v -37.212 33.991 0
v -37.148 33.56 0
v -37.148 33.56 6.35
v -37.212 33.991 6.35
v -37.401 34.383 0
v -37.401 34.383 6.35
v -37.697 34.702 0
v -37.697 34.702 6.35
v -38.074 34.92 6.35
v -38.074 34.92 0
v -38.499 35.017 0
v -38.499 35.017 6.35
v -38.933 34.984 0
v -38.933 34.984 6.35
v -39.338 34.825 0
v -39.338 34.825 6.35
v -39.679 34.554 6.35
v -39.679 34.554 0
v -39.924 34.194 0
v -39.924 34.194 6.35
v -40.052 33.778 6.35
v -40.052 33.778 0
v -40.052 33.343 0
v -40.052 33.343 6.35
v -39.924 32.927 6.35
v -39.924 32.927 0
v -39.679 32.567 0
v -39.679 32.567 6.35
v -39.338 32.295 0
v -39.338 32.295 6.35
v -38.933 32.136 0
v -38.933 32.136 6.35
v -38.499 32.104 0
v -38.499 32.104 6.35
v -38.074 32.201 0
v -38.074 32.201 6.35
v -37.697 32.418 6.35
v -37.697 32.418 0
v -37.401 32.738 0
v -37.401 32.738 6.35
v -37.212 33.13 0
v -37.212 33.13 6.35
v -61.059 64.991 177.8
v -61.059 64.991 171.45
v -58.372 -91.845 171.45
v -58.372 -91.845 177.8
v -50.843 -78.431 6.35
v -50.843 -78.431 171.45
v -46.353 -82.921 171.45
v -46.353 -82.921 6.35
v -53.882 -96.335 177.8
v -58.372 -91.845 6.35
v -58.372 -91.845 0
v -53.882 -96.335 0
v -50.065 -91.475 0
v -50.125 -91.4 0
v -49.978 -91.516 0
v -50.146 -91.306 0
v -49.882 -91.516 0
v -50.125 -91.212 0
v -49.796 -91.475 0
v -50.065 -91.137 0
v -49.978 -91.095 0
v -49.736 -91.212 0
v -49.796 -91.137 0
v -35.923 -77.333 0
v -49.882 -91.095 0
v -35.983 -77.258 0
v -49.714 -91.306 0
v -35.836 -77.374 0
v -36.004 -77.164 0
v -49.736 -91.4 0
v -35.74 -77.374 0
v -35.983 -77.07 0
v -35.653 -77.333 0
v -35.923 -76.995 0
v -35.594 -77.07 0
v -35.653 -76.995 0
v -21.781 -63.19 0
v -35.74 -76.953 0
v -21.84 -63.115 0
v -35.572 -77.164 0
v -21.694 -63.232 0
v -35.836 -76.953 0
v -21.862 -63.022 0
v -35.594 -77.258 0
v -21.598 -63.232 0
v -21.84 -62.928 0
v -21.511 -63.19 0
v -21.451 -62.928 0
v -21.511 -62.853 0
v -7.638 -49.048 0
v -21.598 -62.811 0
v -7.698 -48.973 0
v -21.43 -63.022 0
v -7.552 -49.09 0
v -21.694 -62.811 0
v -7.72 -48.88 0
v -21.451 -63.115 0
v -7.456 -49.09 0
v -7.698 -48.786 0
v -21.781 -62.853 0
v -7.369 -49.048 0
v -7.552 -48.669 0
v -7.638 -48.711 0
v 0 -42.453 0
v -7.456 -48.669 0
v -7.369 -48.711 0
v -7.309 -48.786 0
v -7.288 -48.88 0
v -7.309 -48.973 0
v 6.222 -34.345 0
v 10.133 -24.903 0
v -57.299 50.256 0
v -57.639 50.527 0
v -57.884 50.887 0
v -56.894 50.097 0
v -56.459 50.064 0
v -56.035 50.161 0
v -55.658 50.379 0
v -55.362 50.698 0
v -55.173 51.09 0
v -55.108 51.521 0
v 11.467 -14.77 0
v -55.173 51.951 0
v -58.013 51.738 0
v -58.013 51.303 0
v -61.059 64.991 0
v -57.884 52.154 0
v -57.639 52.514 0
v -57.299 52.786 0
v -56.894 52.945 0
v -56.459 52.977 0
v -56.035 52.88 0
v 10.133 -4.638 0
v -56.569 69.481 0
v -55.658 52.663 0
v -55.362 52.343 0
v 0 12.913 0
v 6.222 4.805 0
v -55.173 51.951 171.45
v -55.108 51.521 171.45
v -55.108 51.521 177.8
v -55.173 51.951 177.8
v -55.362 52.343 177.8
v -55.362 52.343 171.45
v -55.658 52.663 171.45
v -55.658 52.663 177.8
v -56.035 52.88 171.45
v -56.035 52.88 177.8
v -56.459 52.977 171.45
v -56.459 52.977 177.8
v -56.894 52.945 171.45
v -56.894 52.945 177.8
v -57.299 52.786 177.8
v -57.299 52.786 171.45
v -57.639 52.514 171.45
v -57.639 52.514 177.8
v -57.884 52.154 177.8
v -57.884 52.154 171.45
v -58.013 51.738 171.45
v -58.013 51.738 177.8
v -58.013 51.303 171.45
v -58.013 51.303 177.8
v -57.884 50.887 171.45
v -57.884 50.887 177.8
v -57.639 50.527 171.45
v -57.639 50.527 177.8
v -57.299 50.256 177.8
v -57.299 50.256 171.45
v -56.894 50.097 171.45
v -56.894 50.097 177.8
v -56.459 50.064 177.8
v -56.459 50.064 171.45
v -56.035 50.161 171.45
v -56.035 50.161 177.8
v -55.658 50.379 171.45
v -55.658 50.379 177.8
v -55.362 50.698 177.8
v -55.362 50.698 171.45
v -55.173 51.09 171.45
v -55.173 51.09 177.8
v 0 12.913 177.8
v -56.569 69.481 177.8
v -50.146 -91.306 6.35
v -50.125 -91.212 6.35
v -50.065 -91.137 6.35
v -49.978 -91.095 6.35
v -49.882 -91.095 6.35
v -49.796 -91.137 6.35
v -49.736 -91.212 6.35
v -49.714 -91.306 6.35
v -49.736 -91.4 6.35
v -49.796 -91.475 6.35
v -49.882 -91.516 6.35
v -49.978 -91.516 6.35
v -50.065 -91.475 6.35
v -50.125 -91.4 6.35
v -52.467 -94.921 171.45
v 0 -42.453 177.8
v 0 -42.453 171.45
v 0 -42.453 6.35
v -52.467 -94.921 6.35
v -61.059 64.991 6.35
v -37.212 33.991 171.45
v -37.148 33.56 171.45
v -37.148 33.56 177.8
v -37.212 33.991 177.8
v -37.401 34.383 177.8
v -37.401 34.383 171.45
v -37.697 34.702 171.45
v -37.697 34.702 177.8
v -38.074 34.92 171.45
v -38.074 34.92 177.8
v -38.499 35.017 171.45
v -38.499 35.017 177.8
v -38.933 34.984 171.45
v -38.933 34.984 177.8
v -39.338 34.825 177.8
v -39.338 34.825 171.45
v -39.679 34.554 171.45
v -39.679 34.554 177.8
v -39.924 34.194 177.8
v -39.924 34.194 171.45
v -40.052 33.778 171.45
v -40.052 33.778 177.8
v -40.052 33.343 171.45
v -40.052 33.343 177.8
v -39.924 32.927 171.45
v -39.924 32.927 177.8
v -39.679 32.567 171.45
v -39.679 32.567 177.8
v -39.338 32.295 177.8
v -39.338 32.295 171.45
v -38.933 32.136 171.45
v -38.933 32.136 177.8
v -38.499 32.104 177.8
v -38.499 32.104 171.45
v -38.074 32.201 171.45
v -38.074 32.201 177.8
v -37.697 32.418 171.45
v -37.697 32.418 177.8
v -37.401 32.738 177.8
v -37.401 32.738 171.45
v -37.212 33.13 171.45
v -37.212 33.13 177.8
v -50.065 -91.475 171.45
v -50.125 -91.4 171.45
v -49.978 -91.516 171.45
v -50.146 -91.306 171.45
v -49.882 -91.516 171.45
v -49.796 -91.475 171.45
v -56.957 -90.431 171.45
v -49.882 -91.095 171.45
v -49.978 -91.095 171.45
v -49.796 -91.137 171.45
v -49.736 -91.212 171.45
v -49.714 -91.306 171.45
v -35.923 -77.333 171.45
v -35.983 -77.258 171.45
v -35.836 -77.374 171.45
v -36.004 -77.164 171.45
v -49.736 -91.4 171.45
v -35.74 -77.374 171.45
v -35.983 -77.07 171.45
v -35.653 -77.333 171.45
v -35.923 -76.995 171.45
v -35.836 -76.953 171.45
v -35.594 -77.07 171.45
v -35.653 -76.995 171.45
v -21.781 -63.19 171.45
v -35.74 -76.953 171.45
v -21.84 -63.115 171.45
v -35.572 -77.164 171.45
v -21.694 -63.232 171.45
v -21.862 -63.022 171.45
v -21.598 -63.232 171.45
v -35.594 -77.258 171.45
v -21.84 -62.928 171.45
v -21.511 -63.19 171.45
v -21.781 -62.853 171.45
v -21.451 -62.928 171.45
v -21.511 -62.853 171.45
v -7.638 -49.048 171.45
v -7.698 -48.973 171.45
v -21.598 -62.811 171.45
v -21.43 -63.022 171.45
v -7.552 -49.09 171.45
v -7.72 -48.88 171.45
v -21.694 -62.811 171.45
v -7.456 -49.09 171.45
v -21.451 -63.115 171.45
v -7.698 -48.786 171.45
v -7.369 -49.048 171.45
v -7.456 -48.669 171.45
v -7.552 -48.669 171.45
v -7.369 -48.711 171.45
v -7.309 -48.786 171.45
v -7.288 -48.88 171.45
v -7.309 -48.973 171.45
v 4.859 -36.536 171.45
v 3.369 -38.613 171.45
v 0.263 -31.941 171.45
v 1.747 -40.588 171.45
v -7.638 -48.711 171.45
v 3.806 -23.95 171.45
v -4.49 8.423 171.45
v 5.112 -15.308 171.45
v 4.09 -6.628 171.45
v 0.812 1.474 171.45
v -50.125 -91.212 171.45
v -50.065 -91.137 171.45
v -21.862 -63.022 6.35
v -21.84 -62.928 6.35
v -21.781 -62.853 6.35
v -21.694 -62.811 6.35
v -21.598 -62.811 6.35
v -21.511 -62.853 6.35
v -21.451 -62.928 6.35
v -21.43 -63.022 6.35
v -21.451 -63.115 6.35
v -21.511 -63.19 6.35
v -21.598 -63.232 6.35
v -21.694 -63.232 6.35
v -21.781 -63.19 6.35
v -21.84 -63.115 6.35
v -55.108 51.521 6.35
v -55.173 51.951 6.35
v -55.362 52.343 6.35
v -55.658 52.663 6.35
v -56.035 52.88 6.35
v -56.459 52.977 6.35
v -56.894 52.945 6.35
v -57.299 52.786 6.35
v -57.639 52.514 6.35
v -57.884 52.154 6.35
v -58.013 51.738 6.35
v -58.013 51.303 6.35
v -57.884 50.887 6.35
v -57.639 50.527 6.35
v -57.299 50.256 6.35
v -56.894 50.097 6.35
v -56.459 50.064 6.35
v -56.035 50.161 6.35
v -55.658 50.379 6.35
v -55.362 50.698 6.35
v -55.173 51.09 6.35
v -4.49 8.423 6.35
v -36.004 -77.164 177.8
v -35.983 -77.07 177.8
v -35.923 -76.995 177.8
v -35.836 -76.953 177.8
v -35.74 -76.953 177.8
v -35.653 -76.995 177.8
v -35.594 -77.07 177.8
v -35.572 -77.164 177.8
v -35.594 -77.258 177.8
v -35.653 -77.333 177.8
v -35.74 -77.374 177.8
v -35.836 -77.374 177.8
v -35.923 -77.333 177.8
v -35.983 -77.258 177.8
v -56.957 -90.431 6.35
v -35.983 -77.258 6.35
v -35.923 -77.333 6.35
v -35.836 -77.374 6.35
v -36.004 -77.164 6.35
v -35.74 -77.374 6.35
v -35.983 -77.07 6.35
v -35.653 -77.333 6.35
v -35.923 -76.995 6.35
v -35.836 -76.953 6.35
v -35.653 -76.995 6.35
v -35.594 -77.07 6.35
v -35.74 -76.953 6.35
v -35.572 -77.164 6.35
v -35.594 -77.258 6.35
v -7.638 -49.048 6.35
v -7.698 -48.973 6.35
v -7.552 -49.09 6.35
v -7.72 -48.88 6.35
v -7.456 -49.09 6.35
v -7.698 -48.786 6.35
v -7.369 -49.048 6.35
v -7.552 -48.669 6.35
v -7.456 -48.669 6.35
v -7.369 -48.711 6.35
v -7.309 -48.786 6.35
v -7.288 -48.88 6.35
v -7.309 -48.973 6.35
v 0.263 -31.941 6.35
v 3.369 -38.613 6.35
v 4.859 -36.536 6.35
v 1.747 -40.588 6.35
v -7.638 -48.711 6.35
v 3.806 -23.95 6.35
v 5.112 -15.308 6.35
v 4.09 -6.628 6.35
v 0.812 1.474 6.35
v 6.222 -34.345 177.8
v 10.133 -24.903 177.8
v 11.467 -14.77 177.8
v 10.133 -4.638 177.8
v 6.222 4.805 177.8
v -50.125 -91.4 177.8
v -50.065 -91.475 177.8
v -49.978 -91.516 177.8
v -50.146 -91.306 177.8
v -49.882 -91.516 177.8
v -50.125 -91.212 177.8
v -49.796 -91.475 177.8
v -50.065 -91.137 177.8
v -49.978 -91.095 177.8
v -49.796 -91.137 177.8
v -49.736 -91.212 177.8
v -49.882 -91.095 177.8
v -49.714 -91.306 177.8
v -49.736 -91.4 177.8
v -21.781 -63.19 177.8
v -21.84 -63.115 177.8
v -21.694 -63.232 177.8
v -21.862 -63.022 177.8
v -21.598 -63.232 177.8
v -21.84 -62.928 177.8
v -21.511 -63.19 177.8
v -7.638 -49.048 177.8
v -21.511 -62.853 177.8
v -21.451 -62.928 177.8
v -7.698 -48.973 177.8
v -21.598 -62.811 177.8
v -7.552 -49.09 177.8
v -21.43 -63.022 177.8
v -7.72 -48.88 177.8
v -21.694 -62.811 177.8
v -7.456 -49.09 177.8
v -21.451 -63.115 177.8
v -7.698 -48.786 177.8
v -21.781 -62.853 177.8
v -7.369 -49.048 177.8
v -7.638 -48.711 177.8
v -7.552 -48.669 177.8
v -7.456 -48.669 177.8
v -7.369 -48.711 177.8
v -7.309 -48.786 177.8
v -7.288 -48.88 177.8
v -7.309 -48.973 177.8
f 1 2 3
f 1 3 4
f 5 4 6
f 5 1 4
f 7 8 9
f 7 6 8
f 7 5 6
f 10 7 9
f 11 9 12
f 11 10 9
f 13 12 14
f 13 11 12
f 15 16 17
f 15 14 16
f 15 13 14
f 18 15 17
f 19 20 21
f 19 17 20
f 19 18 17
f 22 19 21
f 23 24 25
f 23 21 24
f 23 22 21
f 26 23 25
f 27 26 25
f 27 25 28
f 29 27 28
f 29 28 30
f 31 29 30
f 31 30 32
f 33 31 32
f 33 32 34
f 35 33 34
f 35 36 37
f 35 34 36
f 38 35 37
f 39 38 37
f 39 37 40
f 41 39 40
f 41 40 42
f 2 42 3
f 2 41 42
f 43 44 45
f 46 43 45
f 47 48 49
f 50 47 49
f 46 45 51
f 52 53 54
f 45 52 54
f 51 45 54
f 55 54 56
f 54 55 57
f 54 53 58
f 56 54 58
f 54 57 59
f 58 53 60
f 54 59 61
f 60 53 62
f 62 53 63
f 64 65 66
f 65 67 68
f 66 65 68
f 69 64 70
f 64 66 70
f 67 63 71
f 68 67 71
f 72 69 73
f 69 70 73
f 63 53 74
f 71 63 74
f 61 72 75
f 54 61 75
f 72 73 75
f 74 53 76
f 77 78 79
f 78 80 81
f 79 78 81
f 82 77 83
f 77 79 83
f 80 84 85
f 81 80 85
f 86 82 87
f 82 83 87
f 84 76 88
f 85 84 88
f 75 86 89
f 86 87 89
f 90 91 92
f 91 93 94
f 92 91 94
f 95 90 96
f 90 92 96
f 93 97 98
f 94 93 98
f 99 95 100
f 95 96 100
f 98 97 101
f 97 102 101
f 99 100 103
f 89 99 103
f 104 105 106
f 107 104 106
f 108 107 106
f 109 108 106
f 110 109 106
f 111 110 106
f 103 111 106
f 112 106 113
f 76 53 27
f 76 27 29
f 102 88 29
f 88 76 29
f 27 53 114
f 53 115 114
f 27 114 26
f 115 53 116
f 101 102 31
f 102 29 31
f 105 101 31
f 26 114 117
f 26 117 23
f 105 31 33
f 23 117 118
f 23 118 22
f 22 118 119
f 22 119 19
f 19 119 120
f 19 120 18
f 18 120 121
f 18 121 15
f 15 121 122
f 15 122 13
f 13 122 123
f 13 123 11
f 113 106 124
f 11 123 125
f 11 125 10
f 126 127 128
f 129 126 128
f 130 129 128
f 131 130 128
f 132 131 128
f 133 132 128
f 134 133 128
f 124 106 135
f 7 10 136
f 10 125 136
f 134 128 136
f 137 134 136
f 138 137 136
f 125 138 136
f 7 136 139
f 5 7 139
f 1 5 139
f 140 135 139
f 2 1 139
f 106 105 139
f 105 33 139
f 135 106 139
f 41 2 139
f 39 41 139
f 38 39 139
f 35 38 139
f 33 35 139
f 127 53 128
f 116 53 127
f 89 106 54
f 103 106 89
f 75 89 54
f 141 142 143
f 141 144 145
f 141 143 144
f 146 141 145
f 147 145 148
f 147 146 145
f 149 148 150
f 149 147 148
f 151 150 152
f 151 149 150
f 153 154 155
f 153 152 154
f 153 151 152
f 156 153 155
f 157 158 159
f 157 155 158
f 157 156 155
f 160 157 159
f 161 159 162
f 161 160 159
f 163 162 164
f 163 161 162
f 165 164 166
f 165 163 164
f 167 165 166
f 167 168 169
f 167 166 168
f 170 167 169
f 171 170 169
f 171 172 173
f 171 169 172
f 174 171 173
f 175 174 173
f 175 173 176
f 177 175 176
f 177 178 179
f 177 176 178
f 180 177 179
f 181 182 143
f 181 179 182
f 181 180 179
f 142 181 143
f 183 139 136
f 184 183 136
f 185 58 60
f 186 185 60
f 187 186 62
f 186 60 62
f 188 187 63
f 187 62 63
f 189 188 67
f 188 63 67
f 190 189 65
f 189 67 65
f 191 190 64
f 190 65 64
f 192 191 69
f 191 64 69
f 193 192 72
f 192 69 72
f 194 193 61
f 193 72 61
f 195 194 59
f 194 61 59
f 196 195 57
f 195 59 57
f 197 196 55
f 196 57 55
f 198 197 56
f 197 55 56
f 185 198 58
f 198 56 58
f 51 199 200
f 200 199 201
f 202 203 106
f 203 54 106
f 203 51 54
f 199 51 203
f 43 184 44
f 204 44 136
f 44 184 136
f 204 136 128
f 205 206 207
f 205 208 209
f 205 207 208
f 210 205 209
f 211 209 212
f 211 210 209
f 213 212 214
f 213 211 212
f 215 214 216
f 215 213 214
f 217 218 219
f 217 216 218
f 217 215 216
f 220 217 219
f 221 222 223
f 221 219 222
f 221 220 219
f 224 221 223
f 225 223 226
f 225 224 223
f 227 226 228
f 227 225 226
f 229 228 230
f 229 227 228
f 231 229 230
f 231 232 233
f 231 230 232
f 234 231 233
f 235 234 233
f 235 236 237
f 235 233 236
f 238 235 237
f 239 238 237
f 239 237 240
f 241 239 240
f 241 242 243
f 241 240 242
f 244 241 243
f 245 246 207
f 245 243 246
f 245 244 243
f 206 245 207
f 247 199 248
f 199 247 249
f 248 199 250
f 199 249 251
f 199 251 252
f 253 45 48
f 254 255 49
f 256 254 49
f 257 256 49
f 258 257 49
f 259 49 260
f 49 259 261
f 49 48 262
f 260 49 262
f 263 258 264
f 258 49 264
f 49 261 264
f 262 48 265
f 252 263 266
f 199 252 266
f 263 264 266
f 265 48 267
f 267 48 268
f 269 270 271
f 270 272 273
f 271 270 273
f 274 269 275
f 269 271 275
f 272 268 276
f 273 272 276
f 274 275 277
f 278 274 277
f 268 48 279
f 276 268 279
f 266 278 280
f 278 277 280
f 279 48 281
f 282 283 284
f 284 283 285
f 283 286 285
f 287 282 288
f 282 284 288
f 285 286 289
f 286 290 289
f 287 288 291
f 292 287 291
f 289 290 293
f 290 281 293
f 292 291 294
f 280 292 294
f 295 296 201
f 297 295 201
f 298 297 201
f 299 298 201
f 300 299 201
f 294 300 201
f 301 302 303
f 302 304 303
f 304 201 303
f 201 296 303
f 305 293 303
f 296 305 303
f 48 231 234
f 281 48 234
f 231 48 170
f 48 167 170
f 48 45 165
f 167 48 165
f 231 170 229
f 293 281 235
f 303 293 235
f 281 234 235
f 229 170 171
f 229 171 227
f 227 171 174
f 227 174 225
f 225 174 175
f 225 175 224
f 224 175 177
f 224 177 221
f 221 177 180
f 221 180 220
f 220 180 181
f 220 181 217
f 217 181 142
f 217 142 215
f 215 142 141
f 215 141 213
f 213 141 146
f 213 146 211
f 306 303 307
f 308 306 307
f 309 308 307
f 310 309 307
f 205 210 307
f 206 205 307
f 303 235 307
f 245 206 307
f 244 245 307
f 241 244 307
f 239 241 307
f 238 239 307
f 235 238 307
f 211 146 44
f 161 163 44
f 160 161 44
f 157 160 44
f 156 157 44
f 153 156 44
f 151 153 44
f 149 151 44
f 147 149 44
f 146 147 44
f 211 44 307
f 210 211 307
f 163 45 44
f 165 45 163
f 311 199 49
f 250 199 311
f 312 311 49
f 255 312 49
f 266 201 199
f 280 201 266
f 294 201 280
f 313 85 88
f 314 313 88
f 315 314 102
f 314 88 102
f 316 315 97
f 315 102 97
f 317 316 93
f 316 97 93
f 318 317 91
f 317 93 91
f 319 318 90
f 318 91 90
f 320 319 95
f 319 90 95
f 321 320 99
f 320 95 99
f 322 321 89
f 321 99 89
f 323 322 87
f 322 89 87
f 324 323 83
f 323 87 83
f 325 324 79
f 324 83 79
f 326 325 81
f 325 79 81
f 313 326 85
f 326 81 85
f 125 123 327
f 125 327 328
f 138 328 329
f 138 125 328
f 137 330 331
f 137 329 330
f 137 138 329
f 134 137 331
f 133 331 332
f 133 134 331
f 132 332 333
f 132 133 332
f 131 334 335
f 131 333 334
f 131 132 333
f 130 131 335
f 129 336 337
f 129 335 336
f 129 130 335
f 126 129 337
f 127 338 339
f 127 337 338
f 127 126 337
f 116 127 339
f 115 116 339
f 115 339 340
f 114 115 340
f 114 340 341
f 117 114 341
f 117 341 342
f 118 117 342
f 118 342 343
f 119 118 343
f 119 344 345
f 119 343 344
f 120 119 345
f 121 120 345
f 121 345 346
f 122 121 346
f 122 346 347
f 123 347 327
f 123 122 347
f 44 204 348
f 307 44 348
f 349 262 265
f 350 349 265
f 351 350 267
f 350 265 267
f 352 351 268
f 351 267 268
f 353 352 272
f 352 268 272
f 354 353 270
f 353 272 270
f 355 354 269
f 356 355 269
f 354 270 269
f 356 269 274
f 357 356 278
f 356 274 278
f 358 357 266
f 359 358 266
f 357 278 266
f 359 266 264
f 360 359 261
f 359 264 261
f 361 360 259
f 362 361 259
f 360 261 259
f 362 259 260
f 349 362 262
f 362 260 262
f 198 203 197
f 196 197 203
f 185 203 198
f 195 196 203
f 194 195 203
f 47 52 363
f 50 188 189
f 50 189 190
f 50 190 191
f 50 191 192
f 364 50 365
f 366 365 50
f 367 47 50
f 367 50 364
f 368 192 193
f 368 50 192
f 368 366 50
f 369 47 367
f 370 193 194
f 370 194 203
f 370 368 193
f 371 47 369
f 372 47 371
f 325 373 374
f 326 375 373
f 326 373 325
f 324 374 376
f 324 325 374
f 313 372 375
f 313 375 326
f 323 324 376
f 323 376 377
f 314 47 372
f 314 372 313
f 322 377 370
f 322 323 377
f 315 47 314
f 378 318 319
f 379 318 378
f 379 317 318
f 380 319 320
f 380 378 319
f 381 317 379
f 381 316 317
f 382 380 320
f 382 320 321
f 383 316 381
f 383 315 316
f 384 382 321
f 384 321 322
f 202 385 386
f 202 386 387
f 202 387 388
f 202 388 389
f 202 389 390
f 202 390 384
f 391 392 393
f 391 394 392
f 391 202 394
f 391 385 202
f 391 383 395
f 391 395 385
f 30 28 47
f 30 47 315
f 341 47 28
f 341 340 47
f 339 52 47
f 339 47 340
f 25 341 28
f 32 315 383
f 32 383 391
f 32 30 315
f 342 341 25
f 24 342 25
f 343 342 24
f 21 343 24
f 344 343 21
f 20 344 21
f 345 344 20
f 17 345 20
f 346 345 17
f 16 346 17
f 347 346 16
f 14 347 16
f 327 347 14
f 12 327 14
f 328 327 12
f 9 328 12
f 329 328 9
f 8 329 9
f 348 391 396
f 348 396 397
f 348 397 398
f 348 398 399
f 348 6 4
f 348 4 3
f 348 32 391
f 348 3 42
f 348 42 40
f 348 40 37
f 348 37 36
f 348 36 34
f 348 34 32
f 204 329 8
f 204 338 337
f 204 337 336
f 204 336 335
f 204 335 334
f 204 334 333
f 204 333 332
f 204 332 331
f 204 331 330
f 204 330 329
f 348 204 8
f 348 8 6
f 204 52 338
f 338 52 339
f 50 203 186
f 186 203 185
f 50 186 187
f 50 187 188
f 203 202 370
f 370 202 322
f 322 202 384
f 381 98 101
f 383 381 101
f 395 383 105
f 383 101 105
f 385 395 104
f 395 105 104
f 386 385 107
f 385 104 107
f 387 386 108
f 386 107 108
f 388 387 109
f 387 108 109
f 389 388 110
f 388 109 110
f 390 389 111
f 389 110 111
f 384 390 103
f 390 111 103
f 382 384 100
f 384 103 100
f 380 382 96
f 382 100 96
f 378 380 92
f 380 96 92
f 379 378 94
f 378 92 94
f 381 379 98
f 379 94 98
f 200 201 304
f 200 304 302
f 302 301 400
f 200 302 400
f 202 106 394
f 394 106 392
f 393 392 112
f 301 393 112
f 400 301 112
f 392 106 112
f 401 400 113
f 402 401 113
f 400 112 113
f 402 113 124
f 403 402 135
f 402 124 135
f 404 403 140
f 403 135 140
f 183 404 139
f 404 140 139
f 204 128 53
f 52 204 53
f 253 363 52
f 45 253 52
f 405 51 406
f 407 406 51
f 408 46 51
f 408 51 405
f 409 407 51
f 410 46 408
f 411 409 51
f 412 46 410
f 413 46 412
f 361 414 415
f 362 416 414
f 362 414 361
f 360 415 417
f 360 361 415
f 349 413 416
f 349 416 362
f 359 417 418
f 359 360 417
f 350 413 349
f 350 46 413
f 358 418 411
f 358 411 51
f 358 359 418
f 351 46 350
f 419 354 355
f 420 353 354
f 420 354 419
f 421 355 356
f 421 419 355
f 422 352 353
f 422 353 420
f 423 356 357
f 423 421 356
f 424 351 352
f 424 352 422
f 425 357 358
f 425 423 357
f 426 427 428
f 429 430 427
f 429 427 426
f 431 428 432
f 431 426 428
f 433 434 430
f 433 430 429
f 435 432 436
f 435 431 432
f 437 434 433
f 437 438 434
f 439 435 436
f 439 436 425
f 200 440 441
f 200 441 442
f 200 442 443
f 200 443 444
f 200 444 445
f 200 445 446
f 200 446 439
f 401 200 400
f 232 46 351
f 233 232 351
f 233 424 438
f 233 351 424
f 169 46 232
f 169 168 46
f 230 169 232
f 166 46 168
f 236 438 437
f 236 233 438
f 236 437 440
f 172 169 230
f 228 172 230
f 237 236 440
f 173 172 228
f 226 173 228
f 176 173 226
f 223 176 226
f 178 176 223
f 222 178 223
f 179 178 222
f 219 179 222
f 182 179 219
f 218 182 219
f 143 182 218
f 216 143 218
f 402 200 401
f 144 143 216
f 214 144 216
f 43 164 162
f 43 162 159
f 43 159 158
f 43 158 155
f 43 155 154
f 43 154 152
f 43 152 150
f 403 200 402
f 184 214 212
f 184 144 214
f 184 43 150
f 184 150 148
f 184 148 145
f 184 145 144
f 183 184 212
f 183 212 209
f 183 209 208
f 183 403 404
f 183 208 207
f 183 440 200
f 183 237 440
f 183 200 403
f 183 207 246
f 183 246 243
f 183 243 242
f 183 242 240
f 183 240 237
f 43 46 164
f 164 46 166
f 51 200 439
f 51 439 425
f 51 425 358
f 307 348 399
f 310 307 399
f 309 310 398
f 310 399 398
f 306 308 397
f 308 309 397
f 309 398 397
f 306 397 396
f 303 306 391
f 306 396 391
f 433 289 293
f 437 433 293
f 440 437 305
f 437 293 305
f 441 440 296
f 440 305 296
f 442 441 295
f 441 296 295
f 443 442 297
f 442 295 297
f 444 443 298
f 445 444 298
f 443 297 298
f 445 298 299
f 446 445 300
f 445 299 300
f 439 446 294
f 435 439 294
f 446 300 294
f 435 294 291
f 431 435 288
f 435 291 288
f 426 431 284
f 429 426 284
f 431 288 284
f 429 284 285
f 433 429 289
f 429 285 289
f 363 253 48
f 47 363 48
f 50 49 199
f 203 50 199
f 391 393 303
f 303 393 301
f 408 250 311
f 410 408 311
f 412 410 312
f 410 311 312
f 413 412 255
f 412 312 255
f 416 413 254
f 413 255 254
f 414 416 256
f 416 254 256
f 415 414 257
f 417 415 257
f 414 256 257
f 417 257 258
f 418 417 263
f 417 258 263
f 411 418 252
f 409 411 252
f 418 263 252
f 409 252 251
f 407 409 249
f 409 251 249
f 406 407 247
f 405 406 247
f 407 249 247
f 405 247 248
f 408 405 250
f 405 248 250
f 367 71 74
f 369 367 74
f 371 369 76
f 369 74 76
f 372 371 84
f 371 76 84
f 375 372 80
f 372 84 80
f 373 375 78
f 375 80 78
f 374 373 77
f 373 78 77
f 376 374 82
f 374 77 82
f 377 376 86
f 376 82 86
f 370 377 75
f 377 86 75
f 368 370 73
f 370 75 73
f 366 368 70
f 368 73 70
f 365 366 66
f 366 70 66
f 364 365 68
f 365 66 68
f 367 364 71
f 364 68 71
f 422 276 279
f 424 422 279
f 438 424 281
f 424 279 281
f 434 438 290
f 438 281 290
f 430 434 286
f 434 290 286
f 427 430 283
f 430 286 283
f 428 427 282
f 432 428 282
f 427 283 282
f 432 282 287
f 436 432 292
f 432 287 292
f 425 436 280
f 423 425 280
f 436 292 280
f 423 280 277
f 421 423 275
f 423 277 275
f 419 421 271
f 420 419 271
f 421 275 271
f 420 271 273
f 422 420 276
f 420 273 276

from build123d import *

# Parameters (mm, degrees)
BOSS_EXTRUDE1_DEPTH     = 177.8
BOSS_EXTRUDE2_DEPTH     = 6.35
BOSS_EXTRUDE3_START     = -6.35
BOSS_EXTRUDE3_DEPTH     = 6.35
SKETCH5_W               = 81.82
SKETCH5_H               = 165.1
CUT_EXTRUDE1_DEPTH      = 216.897319711
BOSS_EXTRUDE6_DEPTH     = 165.1
CUT_EXTRUDE2_DEPTH      = 212.237817104
CUT_EXTRUDE2_DEPTH_BACK = 212.237817104
SKETCH9_R               = 1.4605
SKETCH10_R              = 0.2159
CUT_EXTRUDE3_DEPTH      = 212.237817104


with BuildPart() as part:
    # Sketch1 → Boss-Extrude1 (new body)
    with BuildSketch(Plane.XY):
        with BuildLine():
            Line((0, 12.912727148), (-56.568542495, 69.481269642))
            Line((-56.568542495, 69.481269642), (-61.058670555, 64.991141582))
            Line((-61.058670555, 64.991141582), (-4.490128061, 8.422599087))
            ThreePointArc((-4.490128061, 8.422599087), (5.116694028, -14.770321092), (-4.490128061, -37.96324127))
            Line((-4.490128061, -37.96324127), (-58.371664787, -91.844777996))
            Line((-58.371664787, -91.844777996), (-53.881536726, -96.334906057))
            Line((-53.881536726, -96.334906057), (0, -42.453369331))
            ThreePointArc((0, -42.453369331), (11.466694028, -14.770321092), (0, 12.912727148))
        make_face()
    extrude(amount=BOSS_EXTRUDE1_DEPTH)

    # Sketch2 → Boss-Extrude2 (add)
    with BuildSketch(Plane(origin=(0, 0, 0), x_dir=(-1, 0, 0), z_dir=(0, 0, -1))):
        with BuildLine():
            Line((61.058670555, 64.991141582), (58.371664787, -91.844777996))
            Line((58.371664787, -91.844777996), (4.490128061, -37.96324127))
            ThreePointArc((4.490128061, -37.96324127), (-5.116694028, -14.770321092), (4.490128061, 8.422599087))
            Line((4.490128061, 8.422599087), (61.058670555, 64.991141582))
        make_face()
    extrude(amount=-BOSS_EXTRUDE2_DEPTH)

    # Sketch4 → Boss-Extrude3 (add)
    with BuildSketch(Plane.XY.offset(177.8).offset(BOSS_EXTRUDE3_START)):
        with BuildLine():
            Line((-61.058670555, 64.991141582), (-58.371664787, -91.844777996))
            Line((-58.371664787, -91.844777996), (-4.490128061, -37.96324127))
            ThreePointArc((-4.490128061, -37.96324127), (5.116694028, -14.770321092), (-4.490128061, 8.422599087))
            Line((-4.490128061, 8.422599087), (-61.058670555, 64.991141582))
        make_face()
    extrude(amount=BOSS_EXTRUDE3_DEPTH)

    # Sketch5 → Cut-Extrude1 (cut, through all)
    with BuildSketch(Plane(origin=(21.226684665, -21.226684665, 0), x_dir=(0.7071067811865512, 0.7071067811865439, 0), z_dir=(0.7071067811865439, -0.7071067811865512, 0))):
        with Locations((-63.309065338, 88.9)):
            Rectangle(SKETCH5_W, SKETCH5_H)
    extrude(amount=-CUT_EXTRUDE1_DEPTH, mode=Mode.SUBTRACT)

    # Sketch8 → Boss-Extrude6 (add)
    with BuildSketch(Plane.XY.offset(6.35)):
        Polygon((-50.843145831, -78.430564434), (-46.35301777, -82.920692495), (-52.467323164, -94.920692495), (-56.957451225, -90.430564434), align=None)
    extrude(amount=BOSS_EXTRUDE6_DEPTH)

    # Sketch9 → Cut-Extrude2 (cut, two sides: drawn at the far end of the back side and taken through both)
    with BuildSketch(Plane.XY.offset(177.8).offset(-CUT_EXTRUDE2_DEPTH_BACK)):
        with Locations((-56.568542495, 51.5207574)):
            Circle(SKETCH9_R)
        with Locations((-38.608030253, 33.560245158)):
            Circle(SKETCH9_R)
    extrude(amount=CUT_EXTRUDE2_DEPTH + CUT_EXTRUDE2_DEPTH_BACK, mode=Mode.SUBTRACT)

    # Sketch10 → Cut-Extrude3 (cut, through all)
    with BuildSketch(Plane(origin=(0, 0, 0), x_dir=(-1, 0, 0), z_dir=(0, 0, -1))):
        with Locations((49.930224033, -91.305962629)):
            Circle(SKETCH10_R)
        with Locations((35.788088496, -77.163827092)):
            Circle(SKETCH10_R)
        with Locations((21.645952872, -63.021691468)):
            Circle(SKETCH10_R)
        with Locations((7.503817248, -48.879555844)):
            Circle(SKETCH10_R)
        with Locations((-6.638318376, -34.737420221)):
            Circle(SKETCH10_R)
    extrude(amount=-CUT_EXTRUDE3_DEPTH, mode=Mode.SUBTRACT)


solid = part.part
